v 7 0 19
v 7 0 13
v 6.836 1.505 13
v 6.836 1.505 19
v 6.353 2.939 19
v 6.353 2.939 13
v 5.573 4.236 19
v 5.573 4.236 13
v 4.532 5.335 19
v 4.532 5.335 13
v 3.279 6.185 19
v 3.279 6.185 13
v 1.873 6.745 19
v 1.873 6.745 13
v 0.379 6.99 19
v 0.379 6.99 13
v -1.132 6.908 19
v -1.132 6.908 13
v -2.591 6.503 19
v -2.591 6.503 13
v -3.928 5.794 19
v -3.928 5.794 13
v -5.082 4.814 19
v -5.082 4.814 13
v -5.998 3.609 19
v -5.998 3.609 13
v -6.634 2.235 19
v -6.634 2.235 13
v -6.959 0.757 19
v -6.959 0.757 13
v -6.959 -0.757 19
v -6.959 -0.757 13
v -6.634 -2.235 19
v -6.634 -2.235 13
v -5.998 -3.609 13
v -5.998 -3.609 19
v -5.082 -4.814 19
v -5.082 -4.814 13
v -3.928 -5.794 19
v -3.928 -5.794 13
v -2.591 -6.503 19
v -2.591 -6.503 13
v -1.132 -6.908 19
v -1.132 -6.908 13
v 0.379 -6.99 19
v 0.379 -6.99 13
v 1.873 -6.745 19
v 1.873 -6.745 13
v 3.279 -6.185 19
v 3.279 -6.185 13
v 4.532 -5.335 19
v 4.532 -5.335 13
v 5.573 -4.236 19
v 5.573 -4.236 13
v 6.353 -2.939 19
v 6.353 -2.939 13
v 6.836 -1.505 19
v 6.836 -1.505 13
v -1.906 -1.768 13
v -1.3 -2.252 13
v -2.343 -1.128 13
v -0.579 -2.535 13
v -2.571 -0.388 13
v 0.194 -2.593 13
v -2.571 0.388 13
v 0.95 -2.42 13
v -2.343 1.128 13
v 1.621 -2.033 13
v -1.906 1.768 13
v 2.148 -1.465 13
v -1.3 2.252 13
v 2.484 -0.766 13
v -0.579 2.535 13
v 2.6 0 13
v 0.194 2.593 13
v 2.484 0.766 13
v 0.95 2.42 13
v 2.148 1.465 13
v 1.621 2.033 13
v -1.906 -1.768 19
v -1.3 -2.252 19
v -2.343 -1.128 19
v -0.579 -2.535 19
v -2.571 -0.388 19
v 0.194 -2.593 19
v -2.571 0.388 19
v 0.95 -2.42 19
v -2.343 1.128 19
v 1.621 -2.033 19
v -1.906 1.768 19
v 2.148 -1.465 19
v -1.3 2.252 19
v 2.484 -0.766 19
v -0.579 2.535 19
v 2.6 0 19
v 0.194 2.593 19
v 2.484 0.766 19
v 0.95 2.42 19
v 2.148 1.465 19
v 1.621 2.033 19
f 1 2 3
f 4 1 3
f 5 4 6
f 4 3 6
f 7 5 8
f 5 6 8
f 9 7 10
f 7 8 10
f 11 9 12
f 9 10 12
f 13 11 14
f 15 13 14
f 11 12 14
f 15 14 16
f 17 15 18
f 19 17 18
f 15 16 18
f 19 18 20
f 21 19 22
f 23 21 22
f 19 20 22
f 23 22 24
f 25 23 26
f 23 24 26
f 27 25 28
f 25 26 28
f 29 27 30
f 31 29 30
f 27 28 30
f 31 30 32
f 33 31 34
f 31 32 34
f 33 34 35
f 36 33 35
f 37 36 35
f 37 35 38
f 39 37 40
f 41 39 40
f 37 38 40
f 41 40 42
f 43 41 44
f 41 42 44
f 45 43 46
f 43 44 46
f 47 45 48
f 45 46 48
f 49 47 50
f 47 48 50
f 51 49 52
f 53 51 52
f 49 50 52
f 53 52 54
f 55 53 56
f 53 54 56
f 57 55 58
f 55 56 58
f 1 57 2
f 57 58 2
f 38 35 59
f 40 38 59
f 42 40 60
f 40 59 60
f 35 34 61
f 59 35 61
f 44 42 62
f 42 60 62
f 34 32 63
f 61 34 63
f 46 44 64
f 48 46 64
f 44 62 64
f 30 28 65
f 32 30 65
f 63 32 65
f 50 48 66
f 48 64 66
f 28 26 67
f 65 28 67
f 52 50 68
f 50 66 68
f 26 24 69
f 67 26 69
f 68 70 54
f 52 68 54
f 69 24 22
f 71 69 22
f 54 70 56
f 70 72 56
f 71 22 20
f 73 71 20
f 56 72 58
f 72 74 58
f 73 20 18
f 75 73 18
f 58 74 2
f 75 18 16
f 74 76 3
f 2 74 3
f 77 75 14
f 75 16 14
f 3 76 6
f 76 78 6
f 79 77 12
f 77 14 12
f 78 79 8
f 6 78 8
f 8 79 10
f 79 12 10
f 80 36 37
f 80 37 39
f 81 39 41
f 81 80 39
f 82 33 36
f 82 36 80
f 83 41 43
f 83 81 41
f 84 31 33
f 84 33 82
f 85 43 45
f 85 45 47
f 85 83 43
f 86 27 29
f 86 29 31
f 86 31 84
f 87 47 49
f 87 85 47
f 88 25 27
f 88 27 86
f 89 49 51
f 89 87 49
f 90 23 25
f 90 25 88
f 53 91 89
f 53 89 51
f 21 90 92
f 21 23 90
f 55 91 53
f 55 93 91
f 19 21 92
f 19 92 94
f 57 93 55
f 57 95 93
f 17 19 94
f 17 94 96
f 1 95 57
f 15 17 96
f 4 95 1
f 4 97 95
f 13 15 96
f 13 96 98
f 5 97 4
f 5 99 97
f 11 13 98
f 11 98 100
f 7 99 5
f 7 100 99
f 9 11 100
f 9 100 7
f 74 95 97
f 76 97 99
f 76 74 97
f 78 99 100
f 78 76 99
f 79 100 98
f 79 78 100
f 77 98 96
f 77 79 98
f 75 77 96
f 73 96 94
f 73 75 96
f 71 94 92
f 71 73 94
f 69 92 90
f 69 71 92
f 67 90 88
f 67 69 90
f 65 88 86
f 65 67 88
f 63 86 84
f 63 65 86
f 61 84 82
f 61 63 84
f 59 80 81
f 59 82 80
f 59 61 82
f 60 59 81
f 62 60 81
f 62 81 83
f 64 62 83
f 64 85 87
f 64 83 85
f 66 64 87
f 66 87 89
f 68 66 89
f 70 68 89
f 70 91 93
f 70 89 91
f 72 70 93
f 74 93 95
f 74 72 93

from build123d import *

# Parameters (mm, degrees)
CYLINDER044_R     = 2.6
CYLINDER044_DEPTH = 12
CYLINDER041_R     = 7
CYLINDER041_DEPTH = 6


with BuildPart() as v_lec044:
    # Cylinder044 → Cylinder044 (new body)
    with BuildSketch(Plane.XY.offset(13)):
        Circle(CYLINDER044_R)
    extrude(amount=CYLINDER044_DEPTH)


with BuildPart() as cut005:
    # Cylinder041 → Cylinder041 (new body)
    with BuildSketch(Plane.XY.offset(13)):
        Circle(CYLINDER041_R)
    extrude(amount=CYLINDER041_DEPTH)

    # Cut005: cut Válec044
    add(v_lec044.part, mode=Mode.SUBTRACT)


solid = cut005.part
